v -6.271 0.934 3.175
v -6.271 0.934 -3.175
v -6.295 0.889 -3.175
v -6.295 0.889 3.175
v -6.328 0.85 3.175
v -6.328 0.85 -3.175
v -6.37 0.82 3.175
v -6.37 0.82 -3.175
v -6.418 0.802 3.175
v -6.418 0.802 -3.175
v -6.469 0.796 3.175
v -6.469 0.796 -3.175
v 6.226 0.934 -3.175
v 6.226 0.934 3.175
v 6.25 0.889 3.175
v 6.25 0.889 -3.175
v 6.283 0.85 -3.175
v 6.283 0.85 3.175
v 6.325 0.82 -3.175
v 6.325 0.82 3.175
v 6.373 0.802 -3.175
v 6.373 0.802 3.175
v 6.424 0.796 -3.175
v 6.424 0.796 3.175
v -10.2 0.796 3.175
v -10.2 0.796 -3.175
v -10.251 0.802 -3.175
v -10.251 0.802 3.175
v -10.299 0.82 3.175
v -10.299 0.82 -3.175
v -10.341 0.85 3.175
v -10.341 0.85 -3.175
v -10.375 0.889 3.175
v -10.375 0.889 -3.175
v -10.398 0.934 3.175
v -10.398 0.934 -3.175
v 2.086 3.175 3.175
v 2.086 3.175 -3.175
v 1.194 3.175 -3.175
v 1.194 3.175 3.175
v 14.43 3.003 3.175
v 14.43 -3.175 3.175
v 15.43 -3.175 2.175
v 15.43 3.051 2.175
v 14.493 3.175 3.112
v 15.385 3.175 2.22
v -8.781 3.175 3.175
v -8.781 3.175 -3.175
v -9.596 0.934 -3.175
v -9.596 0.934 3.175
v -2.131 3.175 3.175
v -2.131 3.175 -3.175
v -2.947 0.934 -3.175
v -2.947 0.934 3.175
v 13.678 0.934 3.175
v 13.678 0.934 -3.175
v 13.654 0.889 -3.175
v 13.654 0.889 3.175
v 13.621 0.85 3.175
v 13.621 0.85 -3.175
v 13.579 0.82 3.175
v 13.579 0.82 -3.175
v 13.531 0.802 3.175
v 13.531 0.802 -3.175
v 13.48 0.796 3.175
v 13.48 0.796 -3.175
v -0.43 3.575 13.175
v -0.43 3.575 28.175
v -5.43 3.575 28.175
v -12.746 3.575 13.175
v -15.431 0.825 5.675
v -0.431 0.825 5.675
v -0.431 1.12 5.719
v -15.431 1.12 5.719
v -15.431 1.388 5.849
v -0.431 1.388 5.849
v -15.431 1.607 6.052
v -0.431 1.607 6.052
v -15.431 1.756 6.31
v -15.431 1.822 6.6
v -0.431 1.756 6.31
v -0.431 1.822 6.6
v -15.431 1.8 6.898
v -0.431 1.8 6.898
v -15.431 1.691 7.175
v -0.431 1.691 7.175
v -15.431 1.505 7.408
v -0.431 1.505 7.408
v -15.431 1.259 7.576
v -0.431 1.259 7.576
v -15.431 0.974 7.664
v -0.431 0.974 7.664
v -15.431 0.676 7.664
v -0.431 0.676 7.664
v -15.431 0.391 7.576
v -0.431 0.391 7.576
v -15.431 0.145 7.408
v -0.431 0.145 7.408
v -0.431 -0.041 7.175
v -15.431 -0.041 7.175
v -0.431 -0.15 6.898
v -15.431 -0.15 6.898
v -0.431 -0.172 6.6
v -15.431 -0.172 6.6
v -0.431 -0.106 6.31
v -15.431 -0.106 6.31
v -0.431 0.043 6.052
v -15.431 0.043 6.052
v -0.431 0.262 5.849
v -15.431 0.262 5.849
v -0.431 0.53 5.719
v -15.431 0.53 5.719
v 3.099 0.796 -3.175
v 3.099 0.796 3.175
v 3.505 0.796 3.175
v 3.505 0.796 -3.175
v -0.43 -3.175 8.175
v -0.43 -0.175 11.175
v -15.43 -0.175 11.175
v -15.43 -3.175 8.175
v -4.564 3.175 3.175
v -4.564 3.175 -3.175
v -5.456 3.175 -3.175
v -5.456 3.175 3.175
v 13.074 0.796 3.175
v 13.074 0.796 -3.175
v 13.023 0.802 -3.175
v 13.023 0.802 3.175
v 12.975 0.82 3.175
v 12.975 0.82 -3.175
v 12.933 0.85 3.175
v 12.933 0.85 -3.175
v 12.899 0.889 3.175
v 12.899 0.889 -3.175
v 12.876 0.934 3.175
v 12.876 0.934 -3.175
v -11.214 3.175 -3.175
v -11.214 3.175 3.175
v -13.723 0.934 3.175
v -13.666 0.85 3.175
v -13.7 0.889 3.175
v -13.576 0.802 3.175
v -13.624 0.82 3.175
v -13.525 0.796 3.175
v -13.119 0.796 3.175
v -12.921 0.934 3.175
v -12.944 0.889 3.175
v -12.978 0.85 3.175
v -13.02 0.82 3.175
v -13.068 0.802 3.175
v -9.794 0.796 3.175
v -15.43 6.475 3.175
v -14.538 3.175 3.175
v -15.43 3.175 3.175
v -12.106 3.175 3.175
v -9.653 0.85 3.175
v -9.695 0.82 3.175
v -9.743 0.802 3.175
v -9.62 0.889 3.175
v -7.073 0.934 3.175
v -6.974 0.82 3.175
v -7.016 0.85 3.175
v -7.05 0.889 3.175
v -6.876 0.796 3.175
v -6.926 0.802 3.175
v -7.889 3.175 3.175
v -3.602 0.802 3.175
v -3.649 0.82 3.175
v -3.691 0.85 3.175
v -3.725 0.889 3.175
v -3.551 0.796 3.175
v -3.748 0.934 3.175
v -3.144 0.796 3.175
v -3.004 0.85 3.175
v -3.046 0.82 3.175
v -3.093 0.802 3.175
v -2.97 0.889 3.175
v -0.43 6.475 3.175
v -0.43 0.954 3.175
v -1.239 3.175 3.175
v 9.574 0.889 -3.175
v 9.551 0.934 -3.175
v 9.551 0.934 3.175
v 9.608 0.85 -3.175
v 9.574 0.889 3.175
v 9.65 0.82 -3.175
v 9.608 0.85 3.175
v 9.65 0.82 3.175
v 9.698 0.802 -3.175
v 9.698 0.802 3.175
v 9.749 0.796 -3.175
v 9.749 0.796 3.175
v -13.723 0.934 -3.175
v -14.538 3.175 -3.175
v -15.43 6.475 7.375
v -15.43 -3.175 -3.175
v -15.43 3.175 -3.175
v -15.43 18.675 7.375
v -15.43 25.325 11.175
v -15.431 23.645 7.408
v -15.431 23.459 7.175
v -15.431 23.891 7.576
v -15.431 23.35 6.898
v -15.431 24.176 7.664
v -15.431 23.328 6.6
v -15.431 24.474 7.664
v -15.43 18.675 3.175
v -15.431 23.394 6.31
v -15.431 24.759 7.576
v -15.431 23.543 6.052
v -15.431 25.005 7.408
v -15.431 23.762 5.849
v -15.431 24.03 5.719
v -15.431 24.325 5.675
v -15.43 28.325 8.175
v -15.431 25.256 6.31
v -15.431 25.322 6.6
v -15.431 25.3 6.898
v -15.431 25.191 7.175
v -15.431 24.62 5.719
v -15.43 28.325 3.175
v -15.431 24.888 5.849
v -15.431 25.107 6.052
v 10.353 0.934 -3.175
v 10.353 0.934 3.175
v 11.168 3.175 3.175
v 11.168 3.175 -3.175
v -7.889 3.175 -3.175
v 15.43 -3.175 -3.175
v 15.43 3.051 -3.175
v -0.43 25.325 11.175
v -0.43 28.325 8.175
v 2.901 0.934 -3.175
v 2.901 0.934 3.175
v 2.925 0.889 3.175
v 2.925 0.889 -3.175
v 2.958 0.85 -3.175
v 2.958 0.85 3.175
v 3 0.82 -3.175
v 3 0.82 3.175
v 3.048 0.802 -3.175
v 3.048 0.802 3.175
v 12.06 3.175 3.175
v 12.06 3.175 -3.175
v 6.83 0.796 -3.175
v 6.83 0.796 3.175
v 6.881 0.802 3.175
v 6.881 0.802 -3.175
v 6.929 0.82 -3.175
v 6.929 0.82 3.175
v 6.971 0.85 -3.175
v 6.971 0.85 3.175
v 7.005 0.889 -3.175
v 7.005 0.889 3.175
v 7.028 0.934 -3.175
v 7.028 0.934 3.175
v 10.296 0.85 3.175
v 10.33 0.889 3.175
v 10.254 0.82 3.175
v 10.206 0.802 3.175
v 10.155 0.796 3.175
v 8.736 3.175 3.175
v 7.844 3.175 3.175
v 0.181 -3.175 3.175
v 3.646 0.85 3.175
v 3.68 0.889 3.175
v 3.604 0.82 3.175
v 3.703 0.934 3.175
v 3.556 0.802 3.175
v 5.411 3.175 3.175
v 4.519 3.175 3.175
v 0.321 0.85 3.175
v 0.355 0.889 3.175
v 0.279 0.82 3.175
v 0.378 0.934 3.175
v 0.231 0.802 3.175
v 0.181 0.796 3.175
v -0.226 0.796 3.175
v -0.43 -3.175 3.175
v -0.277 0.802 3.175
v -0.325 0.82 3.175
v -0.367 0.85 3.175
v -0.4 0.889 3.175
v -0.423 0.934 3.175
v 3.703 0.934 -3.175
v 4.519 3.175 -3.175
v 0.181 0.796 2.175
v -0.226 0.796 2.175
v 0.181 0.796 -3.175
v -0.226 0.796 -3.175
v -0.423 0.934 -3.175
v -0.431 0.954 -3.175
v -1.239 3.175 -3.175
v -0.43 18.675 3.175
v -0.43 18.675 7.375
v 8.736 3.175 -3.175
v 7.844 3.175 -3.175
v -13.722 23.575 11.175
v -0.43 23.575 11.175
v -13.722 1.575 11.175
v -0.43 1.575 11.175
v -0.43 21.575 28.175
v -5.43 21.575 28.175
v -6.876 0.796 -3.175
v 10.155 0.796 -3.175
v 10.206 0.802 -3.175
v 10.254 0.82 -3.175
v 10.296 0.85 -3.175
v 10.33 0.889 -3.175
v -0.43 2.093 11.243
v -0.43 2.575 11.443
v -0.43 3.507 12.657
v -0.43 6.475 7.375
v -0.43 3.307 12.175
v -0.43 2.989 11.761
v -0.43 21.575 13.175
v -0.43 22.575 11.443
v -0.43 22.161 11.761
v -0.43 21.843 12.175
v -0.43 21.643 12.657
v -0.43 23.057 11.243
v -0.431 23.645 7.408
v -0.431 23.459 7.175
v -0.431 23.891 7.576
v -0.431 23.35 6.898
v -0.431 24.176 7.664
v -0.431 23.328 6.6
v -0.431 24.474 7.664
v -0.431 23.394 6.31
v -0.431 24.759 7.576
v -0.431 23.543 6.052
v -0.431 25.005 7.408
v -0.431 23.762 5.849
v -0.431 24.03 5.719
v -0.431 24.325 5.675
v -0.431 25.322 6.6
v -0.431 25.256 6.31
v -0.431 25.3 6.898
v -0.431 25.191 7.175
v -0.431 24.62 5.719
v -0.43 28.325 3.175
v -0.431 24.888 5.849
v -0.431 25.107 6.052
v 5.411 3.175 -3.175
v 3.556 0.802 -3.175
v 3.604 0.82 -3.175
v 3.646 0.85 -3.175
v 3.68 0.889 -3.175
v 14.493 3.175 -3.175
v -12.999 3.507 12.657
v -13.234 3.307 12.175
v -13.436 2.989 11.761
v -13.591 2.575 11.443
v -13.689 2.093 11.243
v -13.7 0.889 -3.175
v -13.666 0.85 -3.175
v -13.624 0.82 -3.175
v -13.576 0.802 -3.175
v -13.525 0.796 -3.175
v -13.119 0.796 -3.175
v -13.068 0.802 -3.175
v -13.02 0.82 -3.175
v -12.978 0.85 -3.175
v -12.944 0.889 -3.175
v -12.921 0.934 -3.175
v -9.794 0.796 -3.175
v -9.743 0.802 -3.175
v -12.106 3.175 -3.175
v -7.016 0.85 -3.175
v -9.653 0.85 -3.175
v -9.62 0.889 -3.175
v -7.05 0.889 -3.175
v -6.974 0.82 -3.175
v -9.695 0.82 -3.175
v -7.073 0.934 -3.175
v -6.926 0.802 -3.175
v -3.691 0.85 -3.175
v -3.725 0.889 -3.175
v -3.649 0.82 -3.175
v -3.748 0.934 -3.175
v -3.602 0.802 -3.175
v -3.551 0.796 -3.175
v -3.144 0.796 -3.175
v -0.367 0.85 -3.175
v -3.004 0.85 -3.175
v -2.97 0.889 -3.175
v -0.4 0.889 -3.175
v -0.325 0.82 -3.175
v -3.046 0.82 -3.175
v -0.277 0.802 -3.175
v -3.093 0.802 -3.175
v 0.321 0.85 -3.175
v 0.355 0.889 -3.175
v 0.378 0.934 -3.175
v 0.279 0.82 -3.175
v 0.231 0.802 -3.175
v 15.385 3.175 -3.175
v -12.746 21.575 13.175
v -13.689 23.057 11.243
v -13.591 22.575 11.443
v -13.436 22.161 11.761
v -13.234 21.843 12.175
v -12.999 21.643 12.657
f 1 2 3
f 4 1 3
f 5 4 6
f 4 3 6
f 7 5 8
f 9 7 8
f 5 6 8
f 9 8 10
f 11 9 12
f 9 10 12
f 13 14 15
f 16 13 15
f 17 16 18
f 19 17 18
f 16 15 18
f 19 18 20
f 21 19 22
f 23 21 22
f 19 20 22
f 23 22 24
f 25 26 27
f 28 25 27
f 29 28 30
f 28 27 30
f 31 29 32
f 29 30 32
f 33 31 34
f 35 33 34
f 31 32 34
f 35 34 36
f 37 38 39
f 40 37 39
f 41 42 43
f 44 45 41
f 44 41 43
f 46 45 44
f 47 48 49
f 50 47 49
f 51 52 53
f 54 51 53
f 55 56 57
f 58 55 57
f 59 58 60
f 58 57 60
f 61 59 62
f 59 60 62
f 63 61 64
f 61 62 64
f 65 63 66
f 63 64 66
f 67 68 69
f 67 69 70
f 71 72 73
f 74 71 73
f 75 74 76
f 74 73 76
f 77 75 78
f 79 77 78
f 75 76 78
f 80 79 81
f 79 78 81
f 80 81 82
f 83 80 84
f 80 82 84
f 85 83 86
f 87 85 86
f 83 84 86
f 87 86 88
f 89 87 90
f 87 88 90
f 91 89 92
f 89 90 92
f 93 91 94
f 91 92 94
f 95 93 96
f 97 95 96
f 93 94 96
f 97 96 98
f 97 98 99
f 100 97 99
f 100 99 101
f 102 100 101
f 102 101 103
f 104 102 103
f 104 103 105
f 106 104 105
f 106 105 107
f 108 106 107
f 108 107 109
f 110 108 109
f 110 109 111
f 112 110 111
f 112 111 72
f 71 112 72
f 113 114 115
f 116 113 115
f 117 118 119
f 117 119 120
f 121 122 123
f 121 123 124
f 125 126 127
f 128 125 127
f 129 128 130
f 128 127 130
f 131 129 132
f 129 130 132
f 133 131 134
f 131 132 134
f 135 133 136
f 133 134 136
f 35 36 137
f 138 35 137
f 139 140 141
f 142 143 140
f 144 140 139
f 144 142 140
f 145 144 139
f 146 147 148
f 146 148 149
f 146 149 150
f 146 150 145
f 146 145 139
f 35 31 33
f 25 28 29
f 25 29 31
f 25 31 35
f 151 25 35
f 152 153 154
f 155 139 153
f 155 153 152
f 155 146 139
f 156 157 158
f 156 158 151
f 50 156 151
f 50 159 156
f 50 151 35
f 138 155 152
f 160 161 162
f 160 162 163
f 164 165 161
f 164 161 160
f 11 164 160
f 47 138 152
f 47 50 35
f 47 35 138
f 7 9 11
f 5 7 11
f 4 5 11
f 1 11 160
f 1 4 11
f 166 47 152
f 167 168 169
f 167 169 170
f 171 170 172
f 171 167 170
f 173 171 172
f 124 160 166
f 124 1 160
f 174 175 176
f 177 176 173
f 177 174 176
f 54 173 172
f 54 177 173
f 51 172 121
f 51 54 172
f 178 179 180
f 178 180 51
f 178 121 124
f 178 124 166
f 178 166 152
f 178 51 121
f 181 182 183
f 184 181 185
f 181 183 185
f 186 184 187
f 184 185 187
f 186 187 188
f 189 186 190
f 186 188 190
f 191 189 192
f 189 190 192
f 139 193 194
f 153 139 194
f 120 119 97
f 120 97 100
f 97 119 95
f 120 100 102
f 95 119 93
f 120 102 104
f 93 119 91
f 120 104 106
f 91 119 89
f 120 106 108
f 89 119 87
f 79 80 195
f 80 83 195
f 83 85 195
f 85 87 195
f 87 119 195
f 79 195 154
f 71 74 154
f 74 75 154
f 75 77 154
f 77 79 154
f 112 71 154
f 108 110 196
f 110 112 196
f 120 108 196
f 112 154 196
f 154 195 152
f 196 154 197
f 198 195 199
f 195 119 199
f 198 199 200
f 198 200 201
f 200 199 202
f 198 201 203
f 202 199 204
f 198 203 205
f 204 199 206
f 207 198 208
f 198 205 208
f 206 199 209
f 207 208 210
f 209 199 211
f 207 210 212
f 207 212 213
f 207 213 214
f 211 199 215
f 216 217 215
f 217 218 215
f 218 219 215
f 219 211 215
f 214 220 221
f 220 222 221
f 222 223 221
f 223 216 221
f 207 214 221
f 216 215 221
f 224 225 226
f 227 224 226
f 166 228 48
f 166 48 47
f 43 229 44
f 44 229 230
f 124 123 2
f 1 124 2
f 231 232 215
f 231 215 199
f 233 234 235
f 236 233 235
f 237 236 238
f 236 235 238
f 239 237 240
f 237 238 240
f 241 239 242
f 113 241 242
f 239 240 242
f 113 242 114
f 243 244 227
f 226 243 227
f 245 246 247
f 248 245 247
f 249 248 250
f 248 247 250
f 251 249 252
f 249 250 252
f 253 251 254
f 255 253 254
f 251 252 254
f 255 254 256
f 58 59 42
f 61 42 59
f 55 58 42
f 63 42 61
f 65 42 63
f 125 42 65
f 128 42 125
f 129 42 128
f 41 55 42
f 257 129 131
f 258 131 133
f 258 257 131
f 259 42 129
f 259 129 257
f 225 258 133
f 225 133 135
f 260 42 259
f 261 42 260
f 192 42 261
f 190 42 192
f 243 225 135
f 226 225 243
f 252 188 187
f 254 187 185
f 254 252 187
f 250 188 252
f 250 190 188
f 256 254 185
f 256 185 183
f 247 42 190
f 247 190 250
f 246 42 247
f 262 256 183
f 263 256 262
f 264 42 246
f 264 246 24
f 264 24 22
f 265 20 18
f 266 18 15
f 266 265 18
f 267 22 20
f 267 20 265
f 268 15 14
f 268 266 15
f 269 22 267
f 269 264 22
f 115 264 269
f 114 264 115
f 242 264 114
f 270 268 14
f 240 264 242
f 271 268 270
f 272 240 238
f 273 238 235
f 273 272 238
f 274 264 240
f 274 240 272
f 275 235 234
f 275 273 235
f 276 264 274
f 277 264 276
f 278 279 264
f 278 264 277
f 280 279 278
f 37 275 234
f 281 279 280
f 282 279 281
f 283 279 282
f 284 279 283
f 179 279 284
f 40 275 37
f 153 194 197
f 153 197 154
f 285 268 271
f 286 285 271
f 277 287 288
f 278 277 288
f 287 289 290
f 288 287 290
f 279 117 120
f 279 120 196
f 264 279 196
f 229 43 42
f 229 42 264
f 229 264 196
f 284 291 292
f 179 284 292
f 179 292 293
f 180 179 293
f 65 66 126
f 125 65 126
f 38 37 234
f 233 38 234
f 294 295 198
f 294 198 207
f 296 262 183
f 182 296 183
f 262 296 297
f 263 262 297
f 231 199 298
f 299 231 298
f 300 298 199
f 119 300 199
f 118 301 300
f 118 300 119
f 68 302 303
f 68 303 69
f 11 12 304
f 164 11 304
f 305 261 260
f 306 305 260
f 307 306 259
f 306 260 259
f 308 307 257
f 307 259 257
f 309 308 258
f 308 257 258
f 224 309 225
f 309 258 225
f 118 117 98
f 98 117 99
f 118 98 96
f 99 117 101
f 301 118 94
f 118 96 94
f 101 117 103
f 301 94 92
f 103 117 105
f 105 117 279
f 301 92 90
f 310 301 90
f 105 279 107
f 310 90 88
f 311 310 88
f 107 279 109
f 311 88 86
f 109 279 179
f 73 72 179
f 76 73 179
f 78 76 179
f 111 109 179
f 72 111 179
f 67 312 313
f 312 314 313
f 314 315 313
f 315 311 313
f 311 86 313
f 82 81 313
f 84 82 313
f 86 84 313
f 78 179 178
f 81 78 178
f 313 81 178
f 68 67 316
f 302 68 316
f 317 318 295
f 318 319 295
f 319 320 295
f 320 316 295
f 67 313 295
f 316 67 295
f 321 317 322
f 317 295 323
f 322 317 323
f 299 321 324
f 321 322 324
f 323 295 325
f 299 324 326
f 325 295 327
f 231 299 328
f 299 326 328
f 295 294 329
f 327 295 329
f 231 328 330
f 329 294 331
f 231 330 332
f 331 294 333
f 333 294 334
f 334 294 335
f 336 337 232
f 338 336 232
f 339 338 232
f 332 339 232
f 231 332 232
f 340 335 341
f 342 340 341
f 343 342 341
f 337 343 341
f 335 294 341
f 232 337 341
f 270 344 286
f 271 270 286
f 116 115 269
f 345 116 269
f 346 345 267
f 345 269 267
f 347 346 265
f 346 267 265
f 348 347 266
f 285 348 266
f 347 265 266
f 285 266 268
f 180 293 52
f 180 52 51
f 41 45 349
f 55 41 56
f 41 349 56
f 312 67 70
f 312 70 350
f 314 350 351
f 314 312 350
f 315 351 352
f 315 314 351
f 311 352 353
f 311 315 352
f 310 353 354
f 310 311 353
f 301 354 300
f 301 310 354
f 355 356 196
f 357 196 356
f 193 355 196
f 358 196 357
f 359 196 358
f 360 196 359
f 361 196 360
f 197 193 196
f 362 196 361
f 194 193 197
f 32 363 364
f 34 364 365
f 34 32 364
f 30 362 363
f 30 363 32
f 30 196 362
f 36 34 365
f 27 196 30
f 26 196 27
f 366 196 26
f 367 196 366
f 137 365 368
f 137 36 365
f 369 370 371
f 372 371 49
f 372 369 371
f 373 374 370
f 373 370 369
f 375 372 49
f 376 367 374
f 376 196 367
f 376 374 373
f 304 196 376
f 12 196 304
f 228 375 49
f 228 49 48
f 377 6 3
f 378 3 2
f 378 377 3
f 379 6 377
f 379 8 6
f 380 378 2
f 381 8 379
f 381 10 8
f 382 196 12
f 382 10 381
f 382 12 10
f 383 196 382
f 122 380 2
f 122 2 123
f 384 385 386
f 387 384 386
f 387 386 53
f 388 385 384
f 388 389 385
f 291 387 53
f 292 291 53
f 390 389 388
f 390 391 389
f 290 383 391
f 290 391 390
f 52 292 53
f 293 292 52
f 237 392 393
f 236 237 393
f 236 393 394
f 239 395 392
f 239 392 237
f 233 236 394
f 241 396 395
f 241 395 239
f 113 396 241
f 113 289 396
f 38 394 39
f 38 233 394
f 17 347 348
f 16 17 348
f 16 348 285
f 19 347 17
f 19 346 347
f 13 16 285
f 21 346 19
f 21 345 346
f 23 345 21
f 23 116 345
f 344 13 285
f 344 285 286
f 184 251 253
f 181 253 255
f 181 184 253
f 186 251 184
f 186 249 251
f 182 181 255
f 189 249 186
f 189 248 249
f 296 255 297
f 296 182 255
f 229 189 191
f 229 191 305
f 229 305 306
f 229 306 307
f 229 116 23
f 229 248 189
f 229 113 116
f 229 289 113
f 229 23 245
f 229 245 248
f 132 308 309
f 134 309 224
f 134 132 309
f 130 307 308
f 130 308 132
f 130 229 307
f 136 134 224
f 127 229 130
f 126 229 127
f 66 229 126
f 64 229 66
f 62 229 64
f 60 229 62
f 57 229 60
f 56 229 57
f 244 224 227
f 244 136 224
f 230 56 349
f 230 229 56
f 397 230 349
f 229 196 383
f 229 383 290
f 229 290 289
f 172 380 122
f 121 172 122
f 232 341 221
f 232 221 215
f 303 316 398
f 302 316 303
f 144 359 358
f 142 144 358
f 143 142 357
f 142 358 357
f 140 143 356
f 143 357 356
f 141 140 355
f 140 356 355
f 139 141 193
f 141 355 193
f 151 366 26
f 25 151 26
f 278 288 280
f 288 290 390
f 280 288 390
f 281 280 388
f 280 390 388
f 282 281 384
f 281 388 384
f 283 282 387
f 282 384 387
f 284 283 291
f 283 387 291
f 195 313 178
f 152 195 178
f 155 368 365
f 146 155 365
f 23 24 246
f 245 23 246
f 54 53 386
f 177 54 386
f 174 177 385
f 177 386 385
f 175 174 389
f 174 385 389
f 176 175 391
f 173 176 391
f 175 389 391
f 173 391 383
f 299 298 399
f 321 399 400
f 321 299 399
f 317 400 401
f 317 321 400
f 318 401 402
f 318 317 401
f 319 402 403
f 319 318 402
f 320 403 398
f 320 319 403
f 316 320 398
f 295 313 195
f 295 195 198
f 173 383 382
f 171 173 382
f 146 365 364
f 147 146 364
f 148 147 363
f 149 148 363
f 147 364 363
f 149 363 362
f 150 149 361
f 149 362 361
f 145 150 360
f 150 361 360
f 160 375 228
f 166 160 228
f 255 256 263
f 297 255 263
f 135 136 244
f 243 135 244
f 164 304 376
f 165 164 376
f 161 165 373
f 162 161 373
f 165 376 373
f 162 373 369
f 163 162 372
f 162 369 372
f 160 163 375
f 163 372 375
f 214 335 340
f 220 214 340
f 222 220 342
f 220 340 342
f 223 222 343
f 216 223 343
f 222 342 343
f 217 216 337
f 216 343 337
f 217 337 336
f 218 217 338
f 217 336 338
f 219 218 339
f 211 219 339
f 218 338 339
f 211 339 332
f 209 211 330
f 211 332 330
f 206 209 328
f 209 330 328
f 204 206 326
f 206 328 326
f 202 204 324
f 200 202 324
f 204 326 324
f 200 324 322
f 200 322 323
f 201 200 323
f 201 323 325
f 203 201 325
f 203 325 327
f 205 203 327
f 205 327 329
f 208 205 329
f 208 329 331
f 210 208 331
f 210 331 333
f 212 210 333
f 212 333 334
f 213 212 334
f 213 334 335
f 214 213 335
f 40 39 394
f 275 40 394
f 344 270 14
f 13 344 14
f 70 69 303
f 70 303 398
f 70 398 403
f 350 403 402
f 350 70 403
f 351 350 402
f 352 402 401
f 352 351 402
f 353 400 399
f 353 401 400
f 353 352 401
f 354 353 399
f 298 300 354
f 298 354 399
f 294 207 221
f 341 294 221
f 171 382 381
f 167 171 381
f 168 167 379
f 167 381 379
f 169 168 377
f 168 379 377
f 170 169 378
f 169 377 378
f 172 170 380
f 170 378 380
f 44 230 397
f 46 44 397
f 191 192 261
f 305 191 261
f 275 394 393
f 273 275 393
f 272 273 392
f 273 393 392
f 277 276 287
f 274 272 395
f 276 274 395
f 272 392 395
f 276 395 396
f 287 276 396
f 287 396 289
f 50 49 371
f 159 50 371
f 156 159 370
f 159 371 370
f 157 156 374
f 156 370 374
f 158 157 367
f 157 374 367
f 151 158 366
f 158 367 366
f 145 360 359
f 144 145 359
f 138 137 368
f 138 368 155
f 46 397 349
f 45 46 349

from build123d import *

# Parameters (mm, degrees)
BOSS_EXTRUDE1_START       = -0.808533663
BOSS_EXTRUDE1_DEPTH       = 0.808533663
BOSS_EXTRUDE1_START_2     = 0.611119732
BOSS_EXTRUDE1_2_OUTLINE_W = 1
BOSS_EXTRUDE1_2_OUTLINE_H = 6.35
BOSS_EXTRUDE1_2_DEPTH     = 15.249880268
BOSS_EXTRUDE1_3_OUTLINE_W = 1
BOSS_EXTRUDE1_3_OUTLINE_H = 3.970866667
BOSS_EXTRUDE1_3_DEPTH     = 0.80872757
BOSS_EXTRUDE1_4_OUTLINE_W = 1
BOSS_EXTRUDE1_4_OUTLINE_H = 2.379133333
BOSS_EXTRUDE1_4_DEPTH     = 0.204646605
BOSS_EXTRUDE1_START_3     = 2.175
BOSS_EXTRUDE1_5_DEPTH     = 6
BOSS_EXTRUDE1_START_4     = 12.448968436
BOSS_EXTRUDE1_6_OUTLINE_W = 5
BOSS_EXTRUDE1_6_OUTLINE_H = 8.175
BOSS_EXTRUDE1_6_DEPTH     = 1.551031564
BOSS_EXTRUDE2_START       = 5.35
BOSS_EXTRUDE2_DEPTH       = 5.35
CUT_EXTRUDE1_DEPTH        = 6.35
BOSS_EXTRUDE3_DEPTH       = 14.191466337
BOSS_EXTRUDE4_REACH       = 36.333
CUT_EXTRUDE2_DEPTH        = 6.35
CUT_EXTRUDE3_DEPTH        = 6.35
CUT_EXTRUDE4_DEPTH        = 6.35
CUT_EXTRUDE5_DEPTH        = 6.35
CUT_EXTRUDE6_DEPTH        = 6.35
CUT_EXTRUDE7_DEPTH        = 41.809385627
CUT_EXTRUDE8_DEPTH        = 41.809385627
CUT_EXTRUDE9_DEPTH        = 41.809385627
SKETCH15_W                = 4.2
SKETCH15_H                = 12.2
CUT_EXTRUDE10_DEPTH       = 43.984969129
F_3_CLEARANCE_HOLE1_D     = 2
F_3_CLEARANCE_HOLE1_DEPTH = 30.861103078


with BuildPart() as part:
    # Boss-Extrude1: read off the stored shape, not the designer's step
    # Boss-Extrude1 outline → Boss-Extrude1 (new body)
    with BuildSketch(Plane(origin=(-0.4305, 0, 0), x_dir=(0, 0, -1), z_dir=(1, 0, 0)).offset(BOSS_EXTRUDE1_START)):
        Polygon((-11.175, -0.175), (-8.175, -3.175), (-2.175, -3.175), (-2.175, 28.325), (-8.175, 28.325), (-11.175, 25.325), align=None)
    extrude(amount=BOSS_EXTRUDE1_DEPTH)



with BuildPart() as body_2:
    # Boss-Extrude1 2 outline → Boss-Extrude1 2 (new body)
    with BuildSketch(Plane(origin=(-0.4305, 0, 0), x_dir=(0, 0, -1), z_dir=(1, 0, 0)).offset(BOSS_EXTRUDE1_START_2)):
        with Locations((-2.675, 0)):
            Rectangle(BOSS_EXTRUDE1_2_OUTLINE_W, BOSS_EXTRUDE1_2_OUTLINE_H)
    extrude(amount=BOSS_EXTRUDE1_2_DEPTH)


with BuildPart() as part_1:
    add(part.part)

    add(body_2.part)  # Boss-Extrude1 3 merges body 2
    # Boss-Extrude1 3 outline → Boss-Extrude1 3 (add)
    with BuildSketch(Plane(origin=(-0.4305, 0, 0), x_dir=(0, 0, -1), z_dir=(1, 0, 0))):
        with Locations((-2.675, -1.189566667)):
            Rectangle(BOSS_EXTRUDE1_3_OUTLINE_W, BOSS_EXTRUDE1_3_OUTLINE_H)
    extrude(amount=BOSS_EXTRUDE1_3_DEPTH)

    # Boss-Extrude1 4 outline → Boss-Extrude1 4 (add)
    with BuildSketch(Plane(origin=(-0.4305, 0, 0), x_dir=(0, 0, -1), z_dir=(1, 0, 0))):
        with Locations((-2.675, 1.985433334)):
            Rectangle(BOSS_EXTRUDE1_4_OUTLINE_W, BOSS_EXTRUDE1_4_OUTLINE_H)
    extrude(amount=BOSS_EXTRUDE1_4_DEPTH)

    # Boss-Extrude1 5 outline → Boss-Extrude1 5 (cut)
    with BuildSketch(Plane.XY.offset(BOSS_EXTRUDE1_START_3)):
        with BuildLine():
            Line((0.37822757, 0.934233164), (1.1938, 3.175))
            Line((1.1938, 3.175), (0.180619732, 3.175))
            Line((0.180619732, 3.175), (0.180619732, 0.795866667))
            ThreePointArc((0.180619732, 0.795866667), (0.301237045, 0.83389716), (0.37822757, 0.934233164))
        make_face()
        Polygon((15.385266337, 3.175), (15.4305, 3.050721534), (15.4305, 3.175), align=None)
        with BuildLine():
            Line((-0.4305, 0.953572019), (-0.423461232, 0.934233164))
            ThreePointArc((-0.423461232, 0.934233164), (-0.346470708, 0.83389716), (-0.225853395, 0.795866667))
            Line((-0.225853395, 0.795866667), (-0.225853395, 3.175))
            Line((-0.225853395, 3.175), (-0.4305, 3.175))
            Line((-0.4305, 3.175), (-0.4305, 0.953572019))
        make_face()
    extrude(amount=BOSS_EXTRUDE1_5_DEPTH, mode=Mode.SUBTRACT)

    # Boss-Extrude1 6 outline → Boss-Extrude1 6 (cut)
    with BuildSketch(Plane(origin=(0, 0, 0), x_dir=(0.707106781186545, 0, -0.70710678118655), z_dir=(0.70710678118655, 0, 0.707106781186545)).offset(BOSS_EXTRUDE1_START_4)):
        with Locations((8.5, 0.9125)):
            Rectangle(BOSS_EXTRUDE1_6_OUTLINE_W, BOSS_EXTRUDE1_6_OUTLINE_H)
    extrude(amount=BOSS_EXTRUDE1_6_DEPTH, mode=Mode.SUBTRACT)

    # Sketch2 → Boss-Extrude2 (add)
    with BuildSketch(Plane(origin=(0, 0, 2.175), x_dir=(-1, 0, 0), z_dir=(0, 0, -1)).offset(BOSS_EXTRUDE2_START)):
        with BuildLine():
            Line((1.239033663, -3.175), (-15.4305, -3.175))
            Line((-15.4305, -3.175), (-15.4305, 3.050721534))
            Line((-15.4305, 3.050721534), (-15.385266337, 3.175))
            Line((-15.385266337, 3.175), (-1.1938, 3.175))
            Line((-1.1938, 3.175), (-0.37822757, 0.934233164))
            ThreePointArc((-0.37822757, 0.934233164), (-0.301237046, 0.83389716), (-0.180619732, 0.795866667))
            Line((-0.180619732, 0.795866667), (0.225853395, 0.795866667))
            ThreePointArc((0.225853395, 0.795866667), (0.346470708, 0.83389716), (0.423461232, 0.934233164))
            Line((0.423461232, 0.934233164), (0.4305, 0.953572019))
            Line((0.4305, 0.953572019), (0.4305, 28.325))
            Line((0.4305, 28.325), (1.239033663, 28.325))
            Line((1.239033663, 28.325), (1.239033663, -3.175))
        make_face()
    extrude(amount=-BOSS_EXTRUDE2_DEPTH)

    # Sketch3 → Cut-Extrude1 (cut)
    with BuildSketch(Plane(origin=(0, 0, -3.175), x_dir=(-1, 0, 0), z_dir=(0, 0, -1))):
        Polygon((0.4305, 0.953572019), (1.239033663, 3.175), (1.239033663, 28.325), (0.4305, 28.325), align=None)
    extrude(amount=-CUT_EXTRUDE1_DEPTH, mode=Mode.SUBTRACT)

    # Sketch4 → Boss-Extrude3 (add)
    with BuildSketch(Plane.ZY.offset(1.239033663)):
        Polygon((3.175, 3.175), (3.175, 28.325), (8.175, 28.325), (11.175, 25.325), (11.175, -0.175), (8.175, -3.175), (-3.175, -3.175), (-3.175, 3.175), align=None)
    extrude(amount=BOSS_EXTRUDE3_DEPTH)

    # Boss-Extrude4: up to this plane
    boss_extrude4_end = Plane(origin=(-15.488026312, 0, 7.554015165), z_dir=(-0.8987940462991697, 0, 0.438371146789072))
    # Sketch6 → Boss-Extrude4 (add, up to the surface)
    with BuildSketch(Plane(origin=(-0.4305, 0, 0), x_dir=(0, 0, -1), z_dir=(1, 0, 0)), mode=Mode.PRIVATE) as boss_extrude4_sk1:
        with BuildLine():
            Line((-11.175, 1.575), (-11.175, 23.575))
            ThreePointArc((-11.175, 23.575), (-11.760786438, 22.160786438), (-13.175, 21.575))
            Line((-13.175, 21.575), (-28.175, 21.575))
            Line((-28.175, 21.575), (-28.175, 3.575))
            Line((-28.175, 3.575), (-13.175, 3.575))
            ThreePointArc((-13.175, 3.575), (-11.760786438, 2.989213562), (-11.175, 1.575))
        make_face()
    boss_extrude4_tool1 = split(extrude(boss_extrude4_sk1.sketch, amount=-BOSS_EXTRUDE4_REACH, mode=Mode.PRIVATE), bisect_by=boss_extrude4_end, keep=Keep.BOTH, mode=Mode.PRIVATE)
    add(boss_extrude4_tool1.solids().sort_by_distance((-0.4305, 12.575, 19.630069))[0])

    # Sketch7 → Cut-Extrude2 (cut)
    with BuildSketch(Plane(origin=(0, 0, -3.175), x_dir=(-1, 0, 0), z_dir=(0, 0, -1))):
        with BuildLine():
            Line((2.13106, 3.175), (2.94663243, 0.934233164))
            ThreePointArc((2.94663243, 0.934233164), (3.023622954, 0.83389716), (3.144240268, 0.795866667))
            Line((3.144240268, 0.795866667), (3.550713395, 0.795866667))
            ThreePointArc((3.550713395, 0.795866667), (3.671330708, 0.83389716), (3.748321232, 0.934233164))
            Line((3.748321232, 0.934233164), (4.563893663, 3.175))
            Line((4.563893663, 3.175), (2.13106, 3.175))
        make_face()
    extrude(amount=-CUT_EXTRUDE2_DEPTH, mode=Mode.SUBTRACT)

    # Sketch8 → Cut-Extrude3 (cut)
    with BuildSketch(Plane(origin=(0, 0, -3.175), x_dir=(-1, 0, 0), z_dir=(0, 0, -1))):
        with BuildLine():
            Line((5.45592, 3.175), (6.27149243, 0.934233164))
            ThreePointArc((6.27149243, 0.934233164), (6.348482954, 0.83389716), (6.469100268, 0.795866667))
            Line((6.469100268, 0.795866667), (6.875573395, 0.795866667))
            ThreePointArc((6.875573395, 0.795866667), (6.996190708, 0.83389716), (7.073181232, 0.934233164))
            Line((7.073181232, 0.934233164), (7.888753663, 3.175))
            Line((7.888753663, 3.175), (5.45592, 3.175))
        make_face()
    extrude(amount=-CUT_EXTRUDE3_DEPTH, mode=Mode.SUBTRACT)

    # Sketch9 → Cut-Extrude4 (cut)
    with BuildSketch(Plane(origin=(0, 0, -3.175), x_dir=(-1, 0, 0), z_dir=(0, 0, -1))):
        with BuildLine():
            Line((8.78078, 3.175), (9.59635243, 0.934233164))
            ThreePointArc((9.59635243, 0.934233164), (9.673342954, 0.83389716), (9.793960268, 0.795866667))
            Line((9.793960268, 0.795866667), (10.200433395, 0.795866667))
            ThreePointArc((10.200433395, 0.795866667), (10.321050708, 0.83389716), (10.398041232, 0.934233164))
            Line((10.398041232, 0.934233164), (11.213613663, 3.175))
            Line((11.213613663, 3.175), (8.78078, 3.175))
        make_face()
    extrude(amount=-CUT_EXTRUDE4_DEPTH, mode=Mode.SUBTRACT)

    # Sketch10 → Cut-Extrude5 (cut)
    with BuildSketch(Plane(origin=(0, 0, -3.175), x_dir=(-1, 0, 0), z_dir=(0, 0, -1))):
        with BuildLine():
            Line((12.10564, 3.175), (12.92121243, 0.934233164))
            ThreePointArc((12.92121243, 0.934233164), (12.998202954, 0.83389716), (13.118820268, 0.795866667))
            Line((13.118820268, 0.795866667), (13.525293395, 0.795866667))
            ThreePointArc((13.525293395, 0.795866667), (13.645910708, 0.83389716), (13.722901232, 0.934233164))
            Line((13.722901232, 0.934233164), (14.538473663, 3.175))
            Line((14.538473663, 3.175), (12.10564, 3.175))
        make_face()
    extrude(amount=-CUT_EXTRUDE5_DEPTH, mode=Mode.SUBTRACT)

    # Sketch11 → Cut-Extrude6 (cut)
    with BuildSketch(Plane(origin=(0, 0, -3.175), x_dir=(-1, 0, 0), z_dir=(0, 0, -1))):
        with BuildLine():
            Line((-12.060406337, 3.175), (-14.49324, 3.175))
            Line((-14.49324, 3.175), (-13.67766757, 0.934233164))
            ThreePointArc((-13.67766757, 0.934233164), (-13.600677046, 0.83389716), (-13.480059732, 0.795866667))
            Line((-13.480059732, 0.795866667), (-13.073586605, 0.795866667))
            ThreePointArc((-13.073586605, 0.795866667), (-12.952969292, 0.83389716), (-12.875978768, 0.934233164))
            Line((-12.875978768, 0.934233164), (-12.060406337, 3.175))
        make_face()
    extrude(amount=-CUT_EXTRUDE6_DEPTH, mode=Mode.SUBTRACT)

    # Sketch12 → Cut-Extrude7 (cut, through all)
    with BuildSketch(Plane.XY.offset(3.175)):
        with BuildLine():
            Line((2.085826337, 3.175), (2.901398768, 0.934233164))
            ThreePointArc((2.901398768, 0.934233164), (2.978389292, 0.83389716), (3.099006605, 0.795866667))
            Line((3.099006605, 0.795866667), (3.505479732, 0.795866667))
            ThreePointArc((3.505479732, 0.795866667), (3.626097046, 0.83389716), (3.70308757, 0.934233164))
            Line((3.70308757, 0.934233164), (4.51866, 3.175))
            Line((4.51866, 3.175), (2.085826337, 3.175))
        make_face()
    extrude(amount=-CUT_EXTRUDE7_DEPTH, mode=Mode.SUBTRACT)

    # Sketch13 → Cut-Extrude8 (cut, through all)
    with BuildSketch(Plane.XY.offset(3.175)):
        with BuildLine():
            Line((5.410686337, 3.175), (6.226258768, 0.934233164))
            ThreePointArc((6.226258768, 0.934233164), (6.303249292, 0.83389716), (6.423866605, 0.795866667))
            Line((6.423866605, 0.795866667), (6.830339732, 0.795866667))
            ThreePointArc((6.830339732, 0.795866667), (6.950957046, 0.83389716), (7.02794757, 0.934233164))
            Line((7.02794757, 0.934233164), (7.84352, 3.175))
            Line((7.84352, 3.175), (5.410686337, 3.175))
        make_face()
    extrude(amount=-CUT_EXTRUDE8_DEPTH, mode=Mode.SUBTRACT)

    # Sketch14 → Cut-Extrude9 (cut, through all)
    with BuildSketch(Plane.XY.offset(3.175)):
        with BuildLine():
            Line((8.735546337, 3.175), (9.551118768, 0.934233164))
            ThreePointArc((9.551118768, 0.934233164), (9.628109292, 0.83389716), (9.748726605, 0.795866667))
            Line((9.748726605, 0.795866667), (10.155199732, 0.795866667))
            ThreePointArc((10.155199732, 0.795866667), (10.275817046, 0.83389716), (10.35280757, 0.934233164))
            Line((10.35280757, 0.934233164), (11.16838, 3.175))
            Line((11.16838, 3.175), (8.735546337, 3.175))
        make_face()
    extrude(amount=-CUT_EXTRUDE9_DEPTH, mode=Mode.SUBTRACT)

    # Sketch15 → Cut-Extrude10 (cut, through all)
    with BuildSketch(Plane(origin=(-0.4305, 0, 0), x_dir=(0, 0, -1), z_dir=(1, 0, 0))):
        with Locations((-5.275, 12.575)):
            Rectangle(SKETCH15_W, SKETCH15_H)
    extrude(amount=-CUT_EXTRUDE10_DEPTH, mode=Mode.SUBTRACT)

    # #3 Clearance Hole1
    with Locations(Plane.ZY.offset(15.4305)):
        with Locations((6.675, 24.325), (6.675, 0.825)):
            Hole(F_3_CLEARANCE_HOLE1_D / 2, depth=F_3_CLEARANCE_HOLE1_DEPTH)


solid = part_1.part
